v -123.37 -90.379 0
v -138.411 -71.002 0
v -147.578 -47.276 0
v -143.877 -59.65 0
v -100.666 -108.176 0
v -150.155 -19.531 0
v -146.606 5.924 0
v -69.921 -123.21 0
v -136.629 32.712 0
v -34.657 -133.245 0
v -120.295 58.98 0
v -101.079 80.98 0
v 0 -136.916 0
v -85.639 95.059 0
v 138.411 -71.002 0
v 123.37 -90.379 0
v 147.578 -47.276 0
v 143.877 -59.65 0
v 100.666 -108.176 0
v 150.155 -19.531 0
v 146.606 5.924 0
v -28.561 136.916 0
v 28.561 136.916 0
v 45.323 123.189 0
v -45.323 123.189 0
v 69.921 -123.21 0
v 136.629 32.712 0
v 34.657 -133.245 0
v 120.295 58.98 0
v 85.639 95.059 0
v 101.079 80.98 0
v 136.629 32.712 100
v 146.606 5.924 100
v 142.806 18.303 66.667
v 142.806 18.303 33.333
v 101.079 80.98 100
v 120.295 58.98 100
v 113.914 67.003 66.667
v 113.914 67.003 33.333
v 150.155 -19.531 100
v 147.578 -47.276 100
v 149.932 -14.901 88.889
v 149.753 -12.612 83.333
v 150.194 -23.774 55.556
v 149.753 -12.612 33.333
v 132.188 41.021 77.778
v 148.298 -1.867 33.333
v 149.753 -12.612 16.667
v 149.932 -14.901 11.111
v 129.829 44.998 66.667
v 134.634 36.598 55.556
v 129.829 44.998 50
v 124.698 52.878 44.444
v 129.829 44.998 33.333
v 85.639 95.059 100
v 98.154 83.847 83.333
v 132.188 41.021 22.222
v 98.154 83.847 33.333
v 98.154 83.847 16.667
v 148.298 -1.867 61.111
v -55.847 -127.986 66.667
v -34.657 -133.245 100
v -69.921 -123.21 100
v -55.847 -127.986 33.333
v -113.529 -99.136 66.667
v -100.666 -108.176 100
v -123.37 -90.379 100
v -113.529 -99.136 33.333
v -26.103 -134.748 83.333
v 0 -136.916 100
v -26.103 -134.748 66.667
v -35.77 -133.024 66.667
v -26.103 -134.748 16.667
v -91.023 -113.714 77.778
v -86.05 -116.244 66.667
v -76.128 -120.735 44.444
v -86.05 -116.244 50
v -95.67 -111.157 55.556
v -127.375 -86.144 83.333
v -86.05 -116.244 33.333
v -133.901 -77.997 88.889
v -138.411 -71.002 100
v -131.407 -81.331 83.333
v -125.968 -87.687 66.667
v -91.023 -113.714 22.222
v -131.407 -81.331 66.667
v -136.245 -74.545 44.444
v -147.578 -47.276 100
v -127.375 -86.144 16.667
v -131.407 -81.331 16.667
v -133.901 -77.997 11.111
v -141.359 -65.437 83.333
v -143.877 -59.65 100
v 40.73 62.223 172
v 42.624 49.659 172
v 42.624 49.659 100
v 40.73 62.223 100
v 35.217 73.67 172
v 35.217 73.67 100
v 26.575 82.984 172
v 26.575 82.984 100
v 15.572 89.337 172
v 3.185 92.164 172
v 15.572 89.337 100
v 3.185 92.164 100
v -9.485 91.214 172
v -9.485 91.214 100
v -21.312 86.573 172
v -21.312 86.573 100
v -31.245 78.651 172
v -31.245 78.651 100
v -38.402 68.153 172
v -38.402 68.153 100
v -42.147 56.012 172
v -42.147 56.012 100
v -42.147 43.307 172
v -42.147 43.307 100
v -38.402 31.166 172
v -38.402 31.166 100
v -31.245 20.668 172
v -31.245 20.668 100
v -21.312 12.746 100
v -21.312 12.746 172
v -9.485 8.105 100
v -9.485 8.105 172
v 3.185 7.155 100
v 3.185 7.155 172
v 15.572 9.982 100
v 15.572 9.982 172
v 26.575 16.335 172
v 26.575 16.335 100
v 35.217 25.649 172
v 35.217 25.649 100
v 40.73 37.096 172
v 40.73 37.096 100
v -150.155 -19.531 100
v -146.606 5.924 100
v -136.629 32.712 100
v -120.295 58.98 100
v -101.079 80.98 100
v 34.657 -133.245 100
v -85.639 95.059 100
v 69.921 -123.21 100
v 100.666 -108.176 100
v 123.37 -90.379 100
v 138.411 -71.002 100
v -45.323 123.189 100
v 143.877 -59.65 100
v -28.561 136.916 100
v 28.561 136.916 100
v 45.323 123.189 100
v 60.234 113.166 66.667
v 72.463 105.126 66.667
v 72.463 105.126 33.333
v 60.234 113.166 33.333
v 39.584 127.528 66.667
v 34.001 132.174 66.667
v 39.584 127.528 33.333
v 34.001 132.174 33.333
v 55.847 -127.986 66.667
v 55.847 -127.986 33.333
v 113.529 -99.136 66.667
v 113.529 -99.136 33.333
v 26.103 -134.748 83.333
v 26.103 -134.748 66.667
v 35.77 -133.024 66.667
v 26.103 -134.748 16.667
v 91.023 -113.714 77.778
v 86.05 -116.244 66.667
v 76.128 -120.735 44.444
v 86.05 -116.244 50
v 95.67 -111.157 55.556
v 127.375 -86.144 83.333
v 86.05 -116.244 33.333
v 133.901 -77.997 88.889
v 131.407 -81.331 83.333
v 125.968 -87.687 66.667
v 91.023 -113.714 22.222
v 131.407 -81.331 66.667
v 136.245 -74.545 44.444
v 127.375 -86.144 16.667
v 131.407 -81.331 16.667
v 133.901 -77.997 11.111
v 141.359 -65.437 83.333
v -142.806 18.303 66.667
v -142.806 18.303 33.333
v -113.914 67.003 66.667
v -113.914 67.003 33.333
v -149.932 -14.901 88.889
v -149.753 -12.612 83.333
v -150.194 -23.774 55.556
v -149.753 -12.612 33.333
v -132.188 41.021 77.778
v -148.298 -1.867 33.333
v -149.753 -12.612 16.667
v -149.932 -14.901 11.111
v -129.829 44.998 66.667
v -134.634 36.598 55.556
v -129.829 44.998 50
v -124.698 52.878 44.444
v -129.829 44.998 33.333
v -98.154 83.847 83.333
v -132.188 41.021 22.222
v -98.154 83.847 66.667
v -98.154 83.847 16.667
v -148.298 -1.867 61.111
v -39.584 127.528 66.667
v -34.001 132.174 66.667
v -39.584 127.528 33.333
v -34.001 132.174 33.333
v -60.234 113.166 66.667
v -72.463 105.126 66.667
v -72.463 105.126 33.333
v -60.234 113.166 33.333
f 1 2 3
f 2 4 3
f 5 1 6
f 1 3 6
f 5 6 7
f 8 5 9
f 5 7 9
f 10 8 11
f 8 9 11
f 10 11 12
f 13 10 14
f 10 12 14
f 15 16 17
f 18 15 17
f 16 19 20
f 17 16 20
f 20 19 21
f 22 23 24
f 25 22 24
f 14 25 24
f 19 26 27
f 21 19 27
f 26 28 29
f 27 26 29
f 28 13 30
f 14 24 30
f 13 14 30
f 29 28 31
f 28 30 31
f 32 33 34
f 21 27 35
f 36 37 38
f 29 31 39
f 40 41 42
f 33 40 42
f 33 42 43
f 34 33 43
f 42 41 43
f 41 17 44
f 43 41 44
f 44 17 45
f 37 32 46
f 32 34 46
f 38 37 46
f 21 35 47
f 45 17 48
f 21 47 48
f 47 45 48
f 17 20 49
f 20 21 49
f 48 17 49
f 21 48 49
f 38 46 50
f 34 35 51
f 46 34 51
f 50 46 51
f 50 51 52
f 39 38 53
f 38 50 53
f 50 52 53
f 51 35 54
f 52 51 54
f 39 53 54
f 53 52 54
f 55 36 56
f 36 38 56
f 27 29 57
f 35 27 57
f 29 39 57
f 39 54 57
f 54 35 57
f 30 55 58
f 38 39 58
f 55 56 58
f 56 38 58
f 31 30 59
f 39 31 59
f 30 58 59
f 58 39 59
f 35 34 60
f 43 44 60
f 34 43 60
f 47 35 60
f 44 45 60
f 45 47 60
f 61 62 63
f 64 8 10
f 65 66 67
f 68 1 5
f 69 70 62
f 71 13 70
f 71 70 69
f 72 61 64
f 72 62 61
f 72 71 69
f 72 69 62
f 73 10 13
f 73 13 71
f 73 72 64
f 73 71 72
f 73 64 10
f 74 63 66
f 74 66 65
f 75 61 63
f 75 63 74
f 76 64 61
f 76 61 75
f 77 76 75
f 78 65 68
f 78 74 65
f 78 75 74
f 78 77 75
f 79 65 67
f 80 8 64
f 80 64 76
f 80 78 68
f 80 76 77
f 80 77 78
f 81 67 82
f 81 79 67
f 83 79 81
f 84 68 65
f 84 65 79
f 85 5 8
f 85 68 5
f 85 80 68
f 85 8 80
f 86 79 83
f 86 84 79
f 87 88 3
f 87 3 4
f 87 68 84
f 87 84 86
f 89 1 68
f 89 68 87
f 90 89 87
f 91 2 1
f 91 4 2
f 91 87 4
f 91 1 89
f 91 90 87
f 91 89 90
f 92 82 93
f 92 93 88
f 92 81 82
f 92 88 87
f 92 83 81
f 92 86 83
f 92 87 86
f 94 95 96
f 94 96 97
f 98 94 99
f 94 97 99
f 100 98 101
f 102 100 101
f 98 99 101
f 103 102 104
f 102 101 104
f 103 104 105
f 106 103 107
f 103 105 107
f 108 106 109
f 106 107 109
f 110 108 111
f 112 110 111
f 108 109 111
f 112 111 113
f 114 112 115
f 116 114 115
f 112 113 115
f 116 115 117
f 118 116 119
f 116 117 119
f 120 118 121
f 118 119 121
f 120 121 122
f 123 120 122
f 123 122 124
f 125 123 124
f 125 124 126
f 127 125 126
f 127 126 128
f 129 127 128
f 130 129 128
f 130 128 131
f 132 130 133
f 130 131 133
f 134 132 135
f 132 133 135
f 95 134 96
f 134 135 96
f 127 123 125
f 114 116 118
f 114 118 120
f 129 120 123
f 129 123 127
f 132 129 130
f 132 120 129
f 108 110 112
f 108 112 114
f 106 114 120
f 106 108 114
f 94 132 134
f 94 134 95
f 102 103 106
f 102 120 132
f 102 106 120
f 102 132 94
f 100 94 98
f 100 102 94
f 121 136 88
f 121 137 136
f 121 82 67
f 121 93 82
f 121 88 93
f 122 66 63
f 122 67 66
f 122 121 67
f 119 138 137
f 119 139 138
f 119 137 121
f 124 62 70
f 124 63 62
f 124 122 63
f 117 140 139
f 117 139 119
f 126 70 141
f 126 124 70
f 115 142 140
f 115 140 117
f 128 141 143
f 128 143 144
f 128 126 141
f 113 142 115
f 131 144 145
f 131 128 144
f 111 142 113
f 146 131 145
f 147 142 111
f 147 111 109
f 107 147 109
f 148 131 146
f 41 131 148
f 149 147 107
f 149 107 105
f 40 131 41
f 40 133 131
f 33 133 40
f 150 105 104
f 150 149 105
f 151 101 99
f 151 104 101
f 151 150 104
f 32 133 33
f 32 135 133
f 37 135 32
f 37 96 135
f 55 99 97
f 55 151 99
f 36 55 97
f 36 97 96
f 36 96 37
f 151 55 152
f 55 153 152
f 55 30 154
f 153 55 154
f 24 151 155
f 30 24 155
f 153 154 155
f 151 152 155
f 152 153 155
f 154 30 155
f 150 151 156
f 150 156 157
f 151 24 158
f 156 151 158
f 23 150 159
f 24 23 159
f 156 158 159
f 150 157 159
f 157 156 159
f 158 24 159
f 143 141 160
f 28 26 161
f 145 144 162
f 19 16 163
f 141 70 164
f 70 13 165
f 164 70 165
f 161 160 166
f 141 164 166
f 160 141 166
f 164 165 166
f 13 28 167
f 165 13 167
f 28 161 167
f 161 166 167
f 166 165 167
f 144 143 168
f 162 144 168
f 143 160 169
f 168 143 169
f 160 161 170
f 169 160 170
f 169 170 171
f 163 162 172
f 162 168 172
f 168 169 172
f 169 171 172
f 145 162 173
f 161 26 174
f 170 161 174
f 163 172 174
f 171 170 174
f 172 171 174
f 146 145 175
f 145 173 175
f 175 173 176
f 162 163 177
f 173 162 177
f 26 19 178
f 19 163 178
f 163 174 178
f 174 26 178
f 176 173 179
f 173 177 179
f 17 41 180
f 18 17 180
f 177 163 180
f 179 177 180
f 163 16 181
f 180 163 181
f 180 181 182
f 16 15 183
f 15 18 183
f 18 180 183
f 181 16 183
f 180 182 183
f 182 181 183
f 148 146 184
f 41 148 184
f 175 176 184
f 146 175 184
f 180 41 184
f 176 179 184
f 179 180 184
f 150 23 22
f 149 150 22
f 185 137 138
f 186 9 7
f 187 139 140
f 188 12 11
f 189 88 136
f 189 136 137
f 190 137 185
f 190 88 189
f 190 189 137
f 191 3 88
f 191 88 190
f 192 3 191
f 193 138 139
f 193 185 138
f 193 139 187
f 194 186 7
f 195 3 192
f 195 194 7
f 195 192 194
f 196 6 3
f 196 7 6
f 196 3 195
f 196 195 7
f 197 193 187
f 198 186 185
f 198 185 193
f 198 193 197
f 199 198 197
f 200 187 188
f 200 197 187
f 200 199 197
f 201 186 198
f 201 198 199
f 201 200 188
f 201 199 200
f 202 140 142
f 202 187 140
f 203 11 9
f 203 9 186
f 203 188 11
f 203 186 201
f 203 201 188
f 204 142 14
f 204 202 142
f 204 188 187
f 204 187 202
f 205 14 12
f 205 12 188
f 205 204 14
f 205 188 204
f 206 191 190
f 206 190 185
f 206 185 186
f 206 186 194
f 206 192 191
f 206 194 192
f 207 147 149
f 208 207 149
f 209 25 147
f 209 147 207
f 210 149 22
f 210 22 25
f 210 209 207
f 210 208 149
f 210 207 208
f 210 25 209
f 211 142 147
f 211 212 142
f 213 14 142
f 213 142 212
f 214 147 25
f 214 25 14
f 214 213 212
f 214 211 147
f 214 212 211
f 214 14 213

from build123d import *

# Parameters (mm, degrees)
SALIENTE_EXTRUIR1_DEPTH = 100
SALIENTE_EXTRUIR2_DEPTH = 100
CROQUIS13_R             = 42.623507313
SALIENTE_EXTRUIR3_DEPTH = 72


with BuildPart() as part:
    # Croquis1 → Saliente-Extruir1 (new body)
    with BuildSketch(Plane.XY):
        with BuildLine():
            Line((-28.560802162, 136.916395712), (2.54e-07, 136.916395712))
            Line((2.54e-07, 136.916395712), (2.54e-07, -136.916395712))
            add(Edge.make_bspline(
                [(2.54e-07, -136.916395712), (-46.441340442, -136.916395602), (-133.83340639, -111.670406771), (-147.578497366, -47.27649641)],
                knots=[0, 0, 0, 0, 1, 1, 1, 1], degree=3))
            add(Edge.make_bspline(
                [(-147.578497366, -47.27649641), (-163.110192587, 25.487257565), (-105.360717743, 78.580885367), (-85.639397682, 95.058759336)],
                knots=[0, 0, 0, 0, 1, 1, 1, 1], degree=3))
            add(Edge.make_bspline(
                [(-85.639397682, 95.058759336), (-70.778695882, 107.475422336), (-62.78576597, 110.83954464), (-45.323206026, 123.188624336)],
                knots=[0, 0, 0, 0, 1, 1, 1, 1], degree=3))
            add(Edge.make_bspline(
                [(-45.323206026, 123.188624336), (-39.50234289, 127.304974752), (-33.933522938, 132.194713512), (-28.560802162, 136.916395712)],
                knots=[0, 0, 0, 0, 1, 1, 1, 1], degree=3))
        make_face()
    extrude(amount=SALIENTE_EXTRUIR1_DEPTH)

    # Croquis3 → Saliente-Extruir2 (add)
    with BuildSketch(Plane.XY):
        with BuildLine():
            Line((2.54e-07, 136.916395712), (0, -136.916395712))
            add(Edge.make_bspline(
                [(0, -136.916395712), (46.441340696, -136.916395629), (133.833406659, -111.67040685), (147.578497673, -47.276496498)],
                knots=[0, 0, 0, 0, 1, 1, 1, 1], degree=3))
            add(Edge.make_bspline(
                [(147.578497673, -47.276496498), (163.110192997, 25.487257456), (105.360718228, 78.58088534), (85.63939819, 95.058759336)],
                knots=[0, 0, 0, 0, 1, 1, 1, 1], degree=3))
            add(Edge.make_bspline(
                [(85.63939819, 95.058759336), (70.77869639, 107.475422336), (62.785766478, 110.83954464), (45.323206534, 123.188624336)],
                knots=[0, 0, 0, 0, 1, 1, 1, 1], degree=3))
            add(Edge.make_bspline(
                [(45.323206534, 123.188624336), (39.502343398, 127.304974752), (33.933523446, 132.194713512), (28.56080267, 136.916395712)],
                knots=[0, 0, 0, 0, 1, 1, 1, 1], degree=3))
            Line((28.56080267, 136.916395712), (2.54e-07, 136.916395712))
        make_face()
    extrude(amount=SALIENTE_EXTRUIR2_DEPTH)

    # Croquis13 → Saliente-Extruir3 (add)
    with BuildSketch(Plane.XY.offset(100)):
        with Locations((2.54e-07, 49.659481629)):
            Circle(CROQUIS13_R)
    extrude(amount=SALIENTE_EXTRUIR3_DEPTH)


solid = part.part
